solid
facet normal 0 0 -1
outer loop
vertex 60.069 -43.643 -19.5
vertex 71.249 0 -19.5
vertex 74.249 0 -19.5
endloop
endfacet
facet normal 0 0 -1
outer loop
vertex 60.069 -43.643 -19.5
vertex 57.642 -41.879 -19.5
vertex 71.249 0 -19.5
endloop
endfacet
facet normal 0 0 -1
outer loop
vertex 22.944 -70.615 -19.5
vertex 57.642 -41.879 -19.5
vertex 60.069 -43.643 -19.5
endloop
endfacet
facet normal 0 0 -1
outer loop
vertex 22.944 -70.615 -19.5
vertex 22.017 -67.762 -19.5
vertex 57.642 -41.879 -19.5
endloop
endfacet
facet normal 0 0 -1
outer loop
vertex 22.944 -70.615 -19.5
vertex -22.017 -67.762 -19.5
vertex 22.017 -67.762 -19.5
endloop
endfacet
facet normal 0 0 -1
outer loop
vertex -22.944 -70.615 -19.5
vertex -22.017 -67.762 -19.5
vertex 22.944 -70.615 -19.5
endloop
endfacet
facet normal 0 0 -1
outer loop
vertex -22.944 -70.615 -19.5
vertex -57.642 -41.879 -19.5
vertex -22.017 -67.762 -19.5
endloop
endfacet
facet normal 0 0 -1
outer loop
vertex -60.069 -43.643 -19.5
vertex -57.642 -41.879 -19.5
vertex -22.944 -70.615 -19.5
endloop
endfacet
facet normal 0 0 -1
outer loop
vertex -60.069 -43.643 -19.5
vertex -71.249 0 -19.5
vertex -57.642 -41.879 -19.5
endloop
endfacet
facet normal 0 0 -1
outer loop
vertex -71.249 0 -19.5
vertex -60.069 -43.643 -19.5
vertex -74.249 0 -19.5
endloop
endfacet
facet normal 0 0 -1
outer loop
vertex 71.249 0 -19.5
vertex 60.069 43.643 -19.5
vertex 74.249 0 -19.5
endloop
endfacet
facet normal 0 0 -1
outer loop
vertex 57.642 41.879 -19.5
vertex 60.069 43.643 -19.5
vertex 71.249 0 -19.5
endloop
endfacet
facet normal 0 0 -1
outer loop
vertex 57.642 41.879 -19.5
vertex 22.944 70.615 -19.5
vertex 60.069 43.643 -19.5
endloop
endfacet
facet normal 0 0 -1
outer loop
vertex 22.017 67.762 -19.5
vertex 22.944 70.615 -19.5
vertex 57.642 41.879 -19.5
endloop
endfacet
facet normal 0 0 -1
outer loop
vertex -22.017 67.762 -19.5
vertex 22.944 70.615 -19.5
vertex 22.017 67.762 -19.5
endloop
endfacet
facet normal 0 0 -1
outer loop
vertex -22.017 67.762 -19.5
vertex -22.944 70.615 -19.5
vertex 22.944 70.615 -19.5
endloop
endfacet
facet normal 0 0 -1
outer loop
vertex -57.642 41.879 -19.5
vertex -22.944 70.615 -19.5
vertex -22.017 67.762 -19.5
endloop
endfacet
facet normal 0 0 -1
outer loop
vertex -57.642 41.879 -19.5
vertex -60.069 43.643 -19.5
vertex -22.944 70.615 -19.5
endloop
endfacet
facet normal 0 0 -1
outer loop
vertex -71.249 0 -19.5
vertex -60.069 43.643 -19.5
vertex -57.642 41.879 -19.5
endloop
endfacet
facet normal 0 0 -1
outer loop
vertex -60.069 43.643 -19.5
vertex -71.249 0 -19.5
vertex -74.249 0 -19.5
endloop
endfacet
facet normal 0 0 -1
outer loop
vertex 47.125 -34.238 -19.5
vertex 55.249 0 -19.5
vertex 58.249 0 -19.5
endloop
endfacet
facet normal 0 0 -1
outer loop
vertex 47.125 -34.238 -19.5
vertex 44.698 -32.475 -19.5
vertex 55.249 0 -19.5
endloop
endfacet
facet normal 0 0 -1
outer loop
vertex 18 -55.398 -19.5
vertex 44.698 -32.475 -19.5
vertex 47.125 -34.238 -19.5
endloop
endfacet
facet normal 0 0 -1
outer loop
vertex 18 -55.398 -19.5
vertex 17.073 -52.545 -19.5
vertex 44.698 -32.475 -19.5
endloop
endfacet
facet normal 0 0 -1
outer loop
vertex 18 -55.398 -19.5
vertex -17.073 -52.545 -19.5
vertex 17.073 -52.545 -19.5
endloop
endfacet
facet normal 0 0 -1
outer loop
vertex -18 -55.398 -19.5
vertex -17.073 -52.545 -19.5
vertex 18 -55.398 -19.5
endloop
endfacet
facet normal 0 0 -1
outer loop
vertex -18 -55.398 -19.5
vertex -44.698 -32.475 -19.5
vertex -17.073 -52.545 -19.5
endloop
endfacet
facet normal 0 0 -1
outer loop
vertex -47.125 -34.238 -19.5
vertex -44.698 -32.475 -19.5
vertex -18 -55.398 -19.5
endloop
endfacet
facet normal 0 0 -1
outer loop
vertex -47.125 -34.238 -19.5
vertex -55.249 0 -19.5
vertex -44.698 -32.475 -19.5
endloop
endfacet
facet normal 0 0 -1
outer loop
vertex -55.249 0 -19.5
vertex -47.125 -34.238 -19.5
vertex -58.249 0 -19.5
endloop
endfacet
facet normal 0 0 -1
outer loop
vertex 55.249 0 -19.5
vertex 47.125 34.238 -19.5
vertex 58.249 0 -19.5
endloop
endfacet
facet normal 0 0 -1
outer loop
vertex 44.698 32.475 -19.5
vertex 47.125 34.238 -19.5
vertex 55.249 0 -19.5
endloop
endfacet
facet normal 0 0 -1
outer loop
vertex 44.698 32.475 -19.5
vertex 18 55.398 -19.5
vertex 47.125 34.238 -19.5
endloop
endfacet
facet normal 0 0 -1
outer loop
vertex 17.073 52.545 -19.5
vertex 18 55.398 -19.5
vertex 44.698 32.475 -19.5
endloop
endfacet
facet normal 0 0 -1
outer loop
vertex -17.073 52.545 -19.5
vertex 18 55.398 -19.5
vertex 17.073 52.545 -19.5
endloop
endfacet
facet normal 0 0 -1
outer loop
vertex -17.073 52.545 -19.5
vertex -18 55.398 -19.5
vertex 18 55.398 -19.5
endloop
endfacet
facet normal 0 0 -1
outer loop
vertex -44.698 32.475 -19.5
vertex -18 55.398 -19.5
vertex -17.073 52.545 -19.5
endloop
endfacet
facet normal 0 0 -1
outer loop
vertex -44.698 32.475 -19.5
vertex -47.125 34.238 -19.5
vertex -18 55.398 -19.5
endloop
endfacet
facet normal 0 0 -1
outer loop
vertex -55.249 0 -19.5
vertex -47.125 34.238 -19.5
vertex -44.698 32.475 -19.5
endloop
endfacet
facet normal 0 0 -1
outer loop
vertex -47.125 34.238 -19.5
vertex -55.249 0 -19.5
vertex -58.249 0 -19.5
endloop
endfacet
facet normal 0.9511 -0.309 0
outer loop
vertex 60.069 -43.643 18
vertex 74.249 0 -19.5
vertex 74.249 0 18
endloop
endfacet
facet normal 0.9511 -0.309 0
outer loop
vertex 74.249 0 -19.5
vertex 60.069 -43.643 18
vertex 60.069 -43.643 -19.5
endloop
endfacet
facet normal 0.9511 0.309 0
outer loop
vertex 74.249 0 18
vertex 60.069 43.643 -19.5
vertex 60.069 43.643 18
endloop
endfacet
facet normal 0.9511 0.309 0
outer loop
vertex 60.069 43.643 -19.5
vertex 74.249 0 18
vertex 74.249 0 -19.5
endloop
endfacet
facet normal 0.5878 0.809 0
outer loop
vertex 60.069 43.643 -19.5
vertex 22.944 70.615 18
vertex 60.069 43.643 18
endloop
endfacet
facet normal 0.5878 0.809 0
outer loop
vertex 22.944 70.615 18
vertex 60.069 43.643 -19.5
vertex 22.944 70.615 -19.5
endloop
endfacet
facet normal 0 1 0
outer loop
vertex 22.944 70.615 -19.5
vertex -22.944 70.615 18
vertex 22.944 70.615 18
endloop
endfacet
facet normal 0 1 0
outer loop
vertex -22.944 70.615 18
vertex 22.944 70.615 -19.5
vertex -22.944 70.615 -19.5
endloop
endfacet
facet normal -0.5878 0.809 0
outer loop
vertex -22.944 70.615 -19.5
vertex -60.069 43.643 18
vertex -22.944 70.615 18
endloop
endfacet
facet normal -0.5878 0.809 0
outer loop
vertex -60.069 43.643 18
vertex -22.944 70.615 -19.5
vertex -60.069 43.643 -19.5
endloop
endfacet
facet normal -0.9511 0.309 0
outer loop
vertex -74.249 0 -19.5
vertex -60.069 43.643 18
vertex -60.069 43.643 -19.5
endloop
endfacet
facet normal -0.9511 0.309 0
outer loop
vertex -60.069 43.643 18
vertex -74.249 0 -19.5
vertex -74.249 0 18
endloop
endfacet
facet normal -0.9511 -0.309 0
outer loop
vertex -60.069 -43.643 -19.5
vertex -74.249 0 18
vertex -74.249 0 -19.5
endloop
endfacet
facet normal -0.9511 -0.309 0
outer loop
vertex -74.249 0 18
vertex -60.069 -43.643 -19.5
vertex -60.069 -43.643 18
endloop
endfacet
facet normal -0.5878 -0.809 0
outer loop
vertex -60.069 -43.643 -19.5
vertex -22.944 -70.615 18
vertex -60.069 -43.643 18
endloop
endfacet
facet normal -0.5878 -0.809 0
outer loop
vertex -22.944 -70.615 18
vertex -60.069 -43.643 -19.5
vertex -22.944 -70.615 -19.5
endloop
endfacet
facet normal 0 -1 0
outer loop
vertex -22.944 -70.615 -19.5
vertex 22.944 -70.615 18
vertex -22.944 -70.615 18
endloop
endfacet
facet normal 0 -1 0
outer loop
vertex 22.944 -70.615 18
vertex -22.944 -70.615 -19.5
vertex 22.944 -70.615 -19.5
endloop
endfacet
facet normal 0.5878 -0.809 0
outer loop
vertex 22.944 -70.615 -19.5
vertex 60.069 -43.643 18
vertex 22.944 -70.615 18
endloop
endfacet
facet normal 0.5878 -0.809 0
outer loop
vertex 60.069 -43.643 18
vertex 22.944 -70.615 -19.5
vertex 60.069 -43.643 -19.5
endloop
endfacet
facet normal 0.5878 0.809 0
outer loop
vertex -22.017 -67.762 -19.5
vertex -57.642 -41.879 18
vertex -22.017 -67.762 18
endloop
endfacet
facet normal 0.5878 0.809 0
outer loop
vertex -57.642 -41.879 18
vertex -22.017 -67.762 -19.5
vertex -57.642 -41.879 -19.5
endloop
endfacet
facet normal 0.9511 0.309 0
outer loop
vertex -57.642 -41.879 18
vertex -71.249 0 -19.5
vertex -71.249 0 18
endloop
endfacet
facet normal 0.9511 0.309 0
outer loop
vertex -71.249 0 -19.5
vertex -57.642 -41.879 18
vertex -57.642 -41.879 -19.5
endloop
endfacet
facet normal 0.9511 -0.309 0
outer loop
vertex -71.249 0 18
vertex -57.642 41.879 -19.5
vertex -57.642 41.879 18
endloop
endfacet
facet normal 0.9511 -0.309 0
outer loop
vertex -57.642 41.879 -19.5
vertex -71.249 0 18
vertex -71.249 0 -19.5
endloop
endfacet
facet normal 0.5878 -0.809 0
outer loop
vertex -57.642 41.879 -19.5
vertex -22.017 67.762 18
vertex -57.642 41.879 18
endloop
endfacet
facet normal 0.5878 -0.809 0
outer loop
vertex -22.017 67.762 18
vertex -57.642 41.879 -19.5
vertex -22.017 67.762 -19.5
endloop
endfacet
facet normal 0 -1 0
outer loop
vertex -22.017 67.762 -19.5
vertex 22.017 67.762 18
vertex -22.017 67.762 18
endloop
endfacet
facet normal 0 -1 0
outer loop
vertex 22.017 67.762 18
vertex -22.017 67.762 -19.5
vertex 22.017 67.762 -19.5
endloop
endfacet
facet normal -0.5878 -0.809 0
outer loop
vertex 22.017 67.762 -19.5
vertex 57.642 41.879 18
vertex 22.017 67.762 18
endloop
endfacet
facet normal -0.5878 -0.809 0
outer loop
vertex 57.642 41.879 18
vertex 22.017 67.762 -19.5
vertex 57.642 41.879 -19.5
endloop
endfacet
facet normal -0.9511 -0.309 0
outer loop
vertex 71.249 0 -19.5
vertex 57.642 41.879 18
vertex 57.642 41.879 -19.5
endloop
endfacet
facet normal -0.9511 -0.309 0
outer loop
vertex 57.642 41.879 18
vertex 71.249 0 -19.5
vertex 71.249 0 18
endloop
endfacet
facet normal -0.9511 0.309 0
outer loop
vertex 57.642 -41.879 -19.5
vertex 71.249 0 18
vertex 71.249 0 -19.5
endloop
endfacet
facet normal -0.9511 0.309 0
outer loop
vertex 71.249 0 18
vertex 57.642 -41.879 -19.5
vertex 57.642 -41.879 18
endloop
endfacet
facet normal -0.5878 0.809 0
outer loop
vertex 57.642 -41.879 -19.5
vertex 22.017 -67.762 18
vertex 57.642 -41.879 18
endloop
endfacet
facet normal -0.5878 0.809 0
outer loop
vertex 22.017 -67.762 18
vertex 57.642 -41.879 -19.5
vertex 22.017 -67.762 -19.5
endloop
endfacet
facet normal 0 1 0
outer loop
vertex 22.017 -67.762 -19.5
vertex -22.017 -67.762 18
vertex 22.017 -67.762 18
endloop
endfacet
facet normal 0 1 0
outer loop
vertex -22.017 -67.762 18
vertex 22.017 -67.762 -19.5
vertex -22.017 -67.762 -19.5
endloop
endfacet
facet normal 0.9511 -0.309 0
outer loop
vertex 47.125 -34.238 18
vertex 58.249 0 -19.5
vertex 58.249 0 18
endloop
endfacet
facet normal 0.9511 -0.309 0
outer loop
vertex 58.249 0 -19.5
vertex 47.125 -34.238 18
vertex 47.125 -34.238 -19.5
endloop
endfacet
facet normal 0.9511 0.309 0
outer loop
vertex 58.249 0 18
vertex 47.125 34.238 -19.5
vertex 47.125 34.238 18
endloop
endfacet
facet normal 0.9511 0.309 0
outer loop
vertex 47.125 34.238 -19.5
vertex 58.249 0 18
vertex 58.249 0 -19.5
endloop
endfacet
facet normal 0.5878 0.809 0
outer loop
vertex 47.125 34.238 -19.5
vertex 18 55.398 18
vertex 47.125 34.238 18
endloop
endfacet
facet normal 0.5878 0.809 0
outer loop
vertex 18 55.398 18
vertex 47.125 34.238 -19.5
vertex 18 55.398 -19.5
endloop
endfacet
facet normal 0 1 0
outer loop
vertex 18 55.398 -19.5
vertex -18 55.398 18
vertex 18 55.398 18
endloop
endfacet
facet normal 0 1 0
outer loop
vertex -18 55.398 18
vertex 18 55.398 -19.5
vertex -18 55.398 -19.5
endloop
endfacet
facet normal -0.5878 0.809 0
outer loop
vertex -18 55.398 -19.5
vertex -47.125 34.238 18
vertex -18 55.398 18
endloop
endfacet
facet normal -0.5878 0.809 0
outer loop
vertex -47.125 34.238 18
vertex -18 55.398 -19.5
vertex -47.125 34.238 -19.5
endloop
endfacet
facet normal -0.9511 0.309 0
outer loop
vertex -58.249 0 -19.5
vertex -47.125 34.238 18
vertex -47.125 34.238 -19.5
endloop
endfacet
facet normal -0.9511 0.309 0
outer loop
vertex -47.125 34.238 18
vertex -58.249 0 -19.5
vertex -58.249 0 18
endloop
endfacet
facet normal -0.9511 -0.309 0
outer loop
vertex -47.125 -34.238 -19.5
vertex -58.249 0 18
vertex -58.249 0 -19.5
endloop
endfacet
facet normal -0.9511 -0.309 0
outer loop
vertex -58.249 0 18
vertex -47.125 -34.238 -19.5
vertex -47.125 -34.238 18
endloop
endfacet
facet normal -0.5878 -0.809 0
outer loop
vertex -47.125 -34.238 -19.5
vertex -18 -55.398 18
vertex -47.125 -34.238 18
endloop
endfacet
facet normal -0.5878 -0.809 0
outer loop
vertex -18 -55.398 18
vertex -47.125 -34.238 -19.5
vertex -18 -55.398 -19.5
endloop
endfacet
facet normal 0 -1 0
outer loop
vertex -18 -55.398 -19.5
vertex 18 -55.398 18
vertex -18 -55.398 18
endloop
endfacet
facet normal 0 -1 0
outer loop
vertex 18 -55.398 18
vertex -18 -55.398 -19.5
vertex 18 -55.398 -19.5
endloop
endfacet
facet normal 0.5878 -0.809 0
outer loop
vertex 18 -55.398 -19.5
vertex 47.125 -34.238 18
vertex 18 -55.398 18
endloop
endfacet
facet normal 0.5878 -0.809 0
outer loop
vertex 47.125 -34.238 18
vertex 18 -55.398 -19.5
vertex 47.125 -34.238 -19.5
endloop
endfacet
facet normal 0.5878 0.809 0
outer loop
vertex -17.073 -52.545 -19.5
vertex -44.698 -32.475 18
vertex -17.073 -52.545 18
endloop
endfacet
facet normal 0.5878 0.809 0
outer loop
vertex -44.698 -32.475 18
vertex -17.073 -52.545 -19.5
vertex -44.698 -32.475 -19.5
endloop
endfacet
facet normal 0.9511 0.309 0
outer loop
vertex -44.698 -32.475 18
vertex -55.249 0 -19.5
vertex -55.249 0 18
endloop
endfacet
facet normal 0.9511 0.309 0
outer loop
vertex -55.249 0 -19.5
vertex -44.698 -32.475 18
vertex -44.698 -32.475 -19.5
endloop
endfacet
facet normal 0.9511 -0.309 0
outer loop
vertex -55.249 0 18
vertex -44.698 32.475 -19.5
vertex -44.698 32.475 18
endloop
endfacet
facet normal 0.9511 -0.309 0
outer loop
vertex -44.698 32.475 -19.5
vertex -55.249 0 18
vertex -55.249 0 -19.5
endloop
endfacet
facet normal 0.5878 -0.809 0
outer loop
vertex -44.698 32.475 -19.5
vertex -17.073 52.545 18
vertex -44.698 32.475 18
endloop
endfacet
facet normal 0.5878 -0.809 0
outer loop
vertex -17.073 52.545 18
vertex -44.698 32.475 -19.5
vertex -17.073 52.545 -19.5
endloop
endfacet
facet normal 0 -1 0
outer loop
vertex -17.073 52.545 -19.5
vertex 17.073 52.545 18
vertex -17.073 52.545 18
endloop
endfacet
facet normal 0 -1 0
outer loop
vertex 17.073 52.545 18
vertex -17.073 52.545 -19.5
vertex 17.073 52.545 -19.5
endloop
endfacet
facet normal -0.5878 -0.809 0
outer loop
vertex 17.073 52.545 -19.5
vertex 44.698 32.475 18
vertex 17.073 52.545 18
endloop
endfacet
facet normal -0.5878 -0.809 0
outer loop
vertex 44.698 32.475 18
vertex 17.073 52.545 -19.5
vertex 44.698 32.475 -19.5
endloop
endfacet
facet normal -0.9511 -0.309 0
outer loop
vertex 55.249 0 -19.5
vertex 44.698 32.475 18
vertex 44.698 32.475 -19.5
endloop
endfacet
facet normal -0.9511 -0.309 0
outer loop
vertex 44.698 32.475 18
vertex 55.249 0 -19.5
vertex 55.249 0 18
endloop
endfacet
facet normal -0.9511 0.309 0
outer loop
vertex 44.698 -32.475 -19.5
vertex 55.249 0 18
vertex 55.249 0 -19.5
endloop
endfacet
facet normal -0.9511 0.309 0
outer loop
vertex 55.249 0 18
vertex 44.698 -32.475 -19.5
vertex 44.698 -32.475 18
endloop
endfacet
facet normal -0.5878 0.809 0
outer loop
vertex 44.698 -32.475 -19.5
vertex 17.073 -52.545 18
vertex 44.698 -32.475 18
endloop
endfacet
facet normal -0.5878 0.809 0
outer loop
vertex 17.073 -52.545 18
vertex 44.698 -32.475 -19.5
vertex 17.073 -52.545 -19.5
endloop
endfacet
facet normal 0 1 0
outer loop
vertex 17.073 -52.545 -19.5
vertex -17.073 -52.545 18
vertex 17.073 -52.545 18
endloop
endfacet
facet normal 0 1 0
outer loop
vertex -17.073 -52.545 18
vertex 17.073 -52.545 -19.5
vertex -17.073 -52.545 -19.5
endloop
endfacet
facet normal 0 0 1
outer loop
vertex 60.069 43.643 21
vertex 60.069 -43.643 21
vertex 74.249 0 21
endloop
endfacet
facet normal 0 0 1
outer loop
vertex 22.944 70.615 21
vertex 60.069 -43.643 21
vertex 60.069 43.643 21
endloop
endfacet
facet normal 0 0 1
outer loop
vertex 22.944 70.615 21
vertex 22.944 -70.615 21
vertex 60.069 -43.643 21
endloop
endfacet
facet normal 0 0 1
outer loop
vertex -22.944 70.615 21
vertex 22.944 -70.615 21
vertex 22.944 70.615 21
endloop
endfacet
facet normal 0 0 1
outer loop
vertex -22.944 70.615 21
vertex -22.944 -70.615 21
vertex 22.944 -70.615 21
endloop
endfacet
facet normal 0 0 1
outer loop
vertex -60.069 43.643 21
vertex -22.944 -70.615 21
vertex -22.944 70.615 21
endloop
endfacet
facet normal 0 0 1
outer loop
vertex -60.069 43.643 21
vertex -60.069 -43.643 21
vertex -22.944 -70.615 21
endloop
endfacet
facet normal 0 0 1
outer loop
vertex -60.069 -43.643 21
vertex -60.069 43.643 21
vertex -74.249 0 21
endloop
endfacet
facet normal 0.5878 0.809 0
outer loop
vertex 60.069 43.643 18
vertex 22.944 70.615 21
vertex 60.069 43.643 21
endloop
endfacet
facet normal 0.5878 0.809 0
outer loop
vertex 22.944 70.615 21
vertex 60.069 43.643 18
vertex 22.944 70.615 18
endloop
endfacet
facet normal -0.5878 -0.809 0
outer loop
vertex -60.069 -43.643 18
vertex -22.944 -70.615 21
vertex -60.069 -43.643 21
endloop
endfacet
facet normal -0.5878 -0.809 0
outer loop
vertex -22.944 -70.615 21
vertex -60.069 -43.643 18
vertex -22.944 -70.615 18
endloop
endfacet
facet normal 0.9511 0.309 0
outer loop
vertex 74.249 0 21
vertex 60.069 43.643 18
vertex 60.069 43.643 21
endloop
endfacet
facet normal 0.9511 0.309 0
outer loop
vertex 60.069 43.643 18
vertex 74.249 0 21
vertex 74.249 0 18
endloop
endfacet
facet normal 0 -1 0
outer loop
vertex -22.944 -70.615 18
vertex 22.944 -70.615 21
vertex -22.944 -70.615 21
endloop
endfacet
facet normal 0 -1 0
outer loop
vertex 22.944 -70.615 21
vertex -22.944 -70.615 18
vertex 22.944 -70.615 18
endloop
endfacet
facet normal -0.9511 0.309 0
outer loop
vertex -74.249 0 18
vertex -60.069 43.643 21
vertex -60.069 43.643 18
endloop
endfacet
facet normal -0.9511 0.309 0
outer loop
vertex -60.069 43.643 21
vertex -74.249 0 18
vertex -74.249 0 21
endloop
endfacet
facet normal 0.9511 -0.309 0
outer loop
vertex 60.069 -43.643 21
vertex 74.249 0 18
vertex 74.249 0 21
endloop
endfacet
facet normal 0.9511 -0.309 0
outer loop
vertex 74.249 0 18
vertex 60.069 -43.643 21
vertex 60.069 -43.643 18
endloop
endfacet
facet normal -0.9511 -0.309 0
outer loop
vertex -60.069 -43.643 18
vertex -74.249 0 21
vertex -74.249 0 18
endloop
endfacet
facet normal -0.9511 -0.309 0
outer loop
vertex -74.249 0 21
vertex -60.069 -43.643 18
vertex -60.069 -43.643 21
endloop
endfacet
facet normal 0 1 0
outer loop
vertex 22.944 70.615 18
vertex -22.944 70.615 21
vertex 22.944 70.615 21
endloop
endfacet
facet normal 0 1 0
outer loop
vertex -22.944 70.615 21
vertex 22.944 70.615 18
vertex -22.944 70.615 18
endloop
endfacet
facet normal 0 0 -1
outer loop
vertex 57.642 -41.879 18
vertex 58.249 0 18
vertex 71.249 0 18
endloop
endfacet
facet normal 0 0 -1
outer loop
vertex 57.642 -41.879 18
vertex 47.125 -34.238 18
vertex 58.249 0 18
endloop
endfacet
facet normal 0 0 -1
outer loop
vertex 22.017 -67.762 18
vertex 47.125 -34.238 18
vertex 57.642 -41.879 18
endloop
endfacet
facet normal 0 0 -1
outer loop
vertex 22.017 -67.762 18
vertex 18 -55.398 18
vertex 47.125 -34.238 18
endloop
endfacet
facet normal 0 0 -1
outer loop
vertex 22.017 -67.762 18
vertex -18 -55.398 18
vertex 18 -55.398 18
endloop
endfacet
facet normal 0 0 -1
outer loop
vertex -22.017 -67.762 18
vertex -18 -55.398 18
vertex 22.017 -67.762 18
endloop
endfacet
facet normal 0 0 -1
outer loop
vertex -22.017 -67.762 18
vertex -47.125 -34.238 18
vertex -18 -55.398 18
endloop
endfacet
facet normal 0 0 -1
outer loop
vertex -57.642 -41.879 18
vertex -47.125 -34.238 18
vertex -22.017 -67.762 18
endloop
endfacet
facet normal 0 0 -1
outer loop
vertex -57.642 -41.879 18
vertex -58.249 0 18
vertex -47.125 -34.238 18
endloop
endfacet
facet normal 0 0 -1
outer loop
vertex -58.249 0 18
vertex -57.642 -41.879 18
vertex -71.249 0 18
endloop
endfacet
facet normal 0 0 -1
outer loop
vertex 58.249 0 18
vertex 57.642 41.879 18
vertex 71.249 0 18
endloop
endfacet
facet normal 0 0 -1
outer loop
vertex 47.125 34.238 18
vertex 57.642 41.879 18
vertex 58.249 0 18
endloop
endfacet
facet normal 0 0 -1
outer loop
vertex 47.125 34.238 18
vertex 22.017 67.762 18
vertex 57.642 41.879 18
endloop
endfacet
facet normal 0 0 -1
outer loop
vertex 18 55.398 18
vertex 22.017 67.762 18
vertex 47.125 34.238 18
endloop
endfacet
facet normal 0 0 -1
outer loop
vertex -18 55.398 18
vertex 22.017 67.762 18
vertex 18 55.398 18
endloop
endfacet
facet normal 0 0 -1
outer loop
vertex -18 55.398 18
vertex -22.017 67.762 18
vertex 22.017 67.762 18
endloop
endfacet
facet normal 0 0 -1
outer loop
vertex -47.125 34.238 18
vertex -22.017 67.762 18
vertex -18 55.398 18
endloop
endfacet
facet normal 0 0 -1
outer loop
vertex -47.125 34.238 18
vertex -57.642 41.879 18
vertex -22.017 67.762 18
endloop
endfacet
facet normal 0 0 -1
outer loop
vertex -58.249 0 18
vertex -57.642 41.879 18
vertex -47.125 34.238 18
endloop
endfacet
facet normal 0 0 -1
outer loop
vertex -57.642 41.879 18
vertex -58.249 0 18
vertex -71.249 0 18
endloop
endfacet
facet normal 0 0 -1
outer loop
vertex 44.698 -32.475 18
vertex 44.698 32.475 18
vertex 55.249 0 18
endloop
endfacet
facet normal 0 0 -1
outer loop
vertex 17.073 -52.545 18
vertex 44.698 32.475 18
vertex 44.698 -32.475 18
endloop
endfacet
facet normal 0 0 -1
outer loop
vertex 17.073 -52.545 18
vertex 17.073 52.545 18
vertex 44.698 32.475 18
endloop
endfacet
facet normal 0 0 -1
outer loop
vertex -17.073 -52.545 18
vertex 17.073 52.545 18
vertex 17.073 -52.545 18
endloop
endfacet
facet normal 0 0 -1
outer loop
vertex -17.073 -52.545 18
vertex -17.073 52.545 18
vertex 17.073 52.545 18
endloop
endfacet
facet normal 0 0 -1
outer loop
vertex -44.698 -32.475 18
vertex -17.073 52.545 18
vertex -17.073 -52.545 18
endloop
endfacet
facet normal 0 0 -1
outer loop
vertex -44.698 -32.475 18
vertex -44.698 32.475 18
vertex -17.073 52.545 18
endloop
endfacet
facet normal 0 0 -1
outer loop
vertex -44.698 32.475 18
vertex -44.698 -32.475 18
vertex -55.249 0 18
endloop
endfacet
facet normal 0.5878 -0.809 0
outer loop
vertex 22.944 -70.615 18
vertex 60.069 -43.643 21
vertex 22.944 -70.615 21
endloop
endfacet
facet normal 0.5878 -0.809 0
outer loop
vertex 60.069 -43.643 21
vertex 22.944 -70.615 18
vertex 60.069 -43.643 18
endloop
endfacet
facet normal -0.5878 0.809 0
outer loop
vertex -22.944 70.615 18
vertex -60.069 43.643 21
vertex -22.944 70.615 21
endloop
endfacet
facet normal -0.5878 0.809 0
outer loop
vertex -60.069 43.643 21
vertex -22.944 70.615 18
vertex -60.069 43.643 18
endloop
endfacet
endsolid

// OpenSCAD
// file: decagon_lampshade_common.scad
// common code for the lampshade

wall_thickness = 3.0;
bisected_internal_angle = 18;
led_square_length = 36;
interior_channel_width = 13;


module decagon(internal_radius) {
  circle(r = internal_radius, $fn = 10);
}

// decagon has 10 sides, which means the circle that would circumscribe it
// is divided into angles of 36 degrees. But the radii from those points would hit
// the _corners_ of the LED square, so we want to draw a line up through that sqaure
// to create a right triangle whose right angle sits at the intersection with the 
// middle of the square. From that we can derive the hypotenuse of that triangle, which is the radius
function radius_interior(length) = ((length/2)/sin(bisected_internal_angle));

// the standard case of returning the radius interior based on the led_square_length
function standard_radius_interior() = radius_interior(led_square_length);
// main file
// OpenSCAD file for generating a decagon lampshade for the RGB lamp

include <decagon_lampshade_common.scad>;

wall_height = 39;


linear_extrude(height = wall_height, center = true, twist = 0) {

  // outer wall
  difference() {
    decagon(standard_radius_interior() + interior_channel_width + wall_thickness);
    decagon(standard_radius_interior() + interior_channel_width);
  }

  // inner wall
  difference() {
    decagon(standard_radius_interior());

    decagon(standard_radius_interior() - wall_thickness);
   }
}

// roof
translate([0,0, wall_height/2]) {
  linear_extrude(height= wall_thickness, center = true, twist = 0) {
    decagon(standard_radius_interior() + interior_channel_width + wall_thickness);
  }
}
